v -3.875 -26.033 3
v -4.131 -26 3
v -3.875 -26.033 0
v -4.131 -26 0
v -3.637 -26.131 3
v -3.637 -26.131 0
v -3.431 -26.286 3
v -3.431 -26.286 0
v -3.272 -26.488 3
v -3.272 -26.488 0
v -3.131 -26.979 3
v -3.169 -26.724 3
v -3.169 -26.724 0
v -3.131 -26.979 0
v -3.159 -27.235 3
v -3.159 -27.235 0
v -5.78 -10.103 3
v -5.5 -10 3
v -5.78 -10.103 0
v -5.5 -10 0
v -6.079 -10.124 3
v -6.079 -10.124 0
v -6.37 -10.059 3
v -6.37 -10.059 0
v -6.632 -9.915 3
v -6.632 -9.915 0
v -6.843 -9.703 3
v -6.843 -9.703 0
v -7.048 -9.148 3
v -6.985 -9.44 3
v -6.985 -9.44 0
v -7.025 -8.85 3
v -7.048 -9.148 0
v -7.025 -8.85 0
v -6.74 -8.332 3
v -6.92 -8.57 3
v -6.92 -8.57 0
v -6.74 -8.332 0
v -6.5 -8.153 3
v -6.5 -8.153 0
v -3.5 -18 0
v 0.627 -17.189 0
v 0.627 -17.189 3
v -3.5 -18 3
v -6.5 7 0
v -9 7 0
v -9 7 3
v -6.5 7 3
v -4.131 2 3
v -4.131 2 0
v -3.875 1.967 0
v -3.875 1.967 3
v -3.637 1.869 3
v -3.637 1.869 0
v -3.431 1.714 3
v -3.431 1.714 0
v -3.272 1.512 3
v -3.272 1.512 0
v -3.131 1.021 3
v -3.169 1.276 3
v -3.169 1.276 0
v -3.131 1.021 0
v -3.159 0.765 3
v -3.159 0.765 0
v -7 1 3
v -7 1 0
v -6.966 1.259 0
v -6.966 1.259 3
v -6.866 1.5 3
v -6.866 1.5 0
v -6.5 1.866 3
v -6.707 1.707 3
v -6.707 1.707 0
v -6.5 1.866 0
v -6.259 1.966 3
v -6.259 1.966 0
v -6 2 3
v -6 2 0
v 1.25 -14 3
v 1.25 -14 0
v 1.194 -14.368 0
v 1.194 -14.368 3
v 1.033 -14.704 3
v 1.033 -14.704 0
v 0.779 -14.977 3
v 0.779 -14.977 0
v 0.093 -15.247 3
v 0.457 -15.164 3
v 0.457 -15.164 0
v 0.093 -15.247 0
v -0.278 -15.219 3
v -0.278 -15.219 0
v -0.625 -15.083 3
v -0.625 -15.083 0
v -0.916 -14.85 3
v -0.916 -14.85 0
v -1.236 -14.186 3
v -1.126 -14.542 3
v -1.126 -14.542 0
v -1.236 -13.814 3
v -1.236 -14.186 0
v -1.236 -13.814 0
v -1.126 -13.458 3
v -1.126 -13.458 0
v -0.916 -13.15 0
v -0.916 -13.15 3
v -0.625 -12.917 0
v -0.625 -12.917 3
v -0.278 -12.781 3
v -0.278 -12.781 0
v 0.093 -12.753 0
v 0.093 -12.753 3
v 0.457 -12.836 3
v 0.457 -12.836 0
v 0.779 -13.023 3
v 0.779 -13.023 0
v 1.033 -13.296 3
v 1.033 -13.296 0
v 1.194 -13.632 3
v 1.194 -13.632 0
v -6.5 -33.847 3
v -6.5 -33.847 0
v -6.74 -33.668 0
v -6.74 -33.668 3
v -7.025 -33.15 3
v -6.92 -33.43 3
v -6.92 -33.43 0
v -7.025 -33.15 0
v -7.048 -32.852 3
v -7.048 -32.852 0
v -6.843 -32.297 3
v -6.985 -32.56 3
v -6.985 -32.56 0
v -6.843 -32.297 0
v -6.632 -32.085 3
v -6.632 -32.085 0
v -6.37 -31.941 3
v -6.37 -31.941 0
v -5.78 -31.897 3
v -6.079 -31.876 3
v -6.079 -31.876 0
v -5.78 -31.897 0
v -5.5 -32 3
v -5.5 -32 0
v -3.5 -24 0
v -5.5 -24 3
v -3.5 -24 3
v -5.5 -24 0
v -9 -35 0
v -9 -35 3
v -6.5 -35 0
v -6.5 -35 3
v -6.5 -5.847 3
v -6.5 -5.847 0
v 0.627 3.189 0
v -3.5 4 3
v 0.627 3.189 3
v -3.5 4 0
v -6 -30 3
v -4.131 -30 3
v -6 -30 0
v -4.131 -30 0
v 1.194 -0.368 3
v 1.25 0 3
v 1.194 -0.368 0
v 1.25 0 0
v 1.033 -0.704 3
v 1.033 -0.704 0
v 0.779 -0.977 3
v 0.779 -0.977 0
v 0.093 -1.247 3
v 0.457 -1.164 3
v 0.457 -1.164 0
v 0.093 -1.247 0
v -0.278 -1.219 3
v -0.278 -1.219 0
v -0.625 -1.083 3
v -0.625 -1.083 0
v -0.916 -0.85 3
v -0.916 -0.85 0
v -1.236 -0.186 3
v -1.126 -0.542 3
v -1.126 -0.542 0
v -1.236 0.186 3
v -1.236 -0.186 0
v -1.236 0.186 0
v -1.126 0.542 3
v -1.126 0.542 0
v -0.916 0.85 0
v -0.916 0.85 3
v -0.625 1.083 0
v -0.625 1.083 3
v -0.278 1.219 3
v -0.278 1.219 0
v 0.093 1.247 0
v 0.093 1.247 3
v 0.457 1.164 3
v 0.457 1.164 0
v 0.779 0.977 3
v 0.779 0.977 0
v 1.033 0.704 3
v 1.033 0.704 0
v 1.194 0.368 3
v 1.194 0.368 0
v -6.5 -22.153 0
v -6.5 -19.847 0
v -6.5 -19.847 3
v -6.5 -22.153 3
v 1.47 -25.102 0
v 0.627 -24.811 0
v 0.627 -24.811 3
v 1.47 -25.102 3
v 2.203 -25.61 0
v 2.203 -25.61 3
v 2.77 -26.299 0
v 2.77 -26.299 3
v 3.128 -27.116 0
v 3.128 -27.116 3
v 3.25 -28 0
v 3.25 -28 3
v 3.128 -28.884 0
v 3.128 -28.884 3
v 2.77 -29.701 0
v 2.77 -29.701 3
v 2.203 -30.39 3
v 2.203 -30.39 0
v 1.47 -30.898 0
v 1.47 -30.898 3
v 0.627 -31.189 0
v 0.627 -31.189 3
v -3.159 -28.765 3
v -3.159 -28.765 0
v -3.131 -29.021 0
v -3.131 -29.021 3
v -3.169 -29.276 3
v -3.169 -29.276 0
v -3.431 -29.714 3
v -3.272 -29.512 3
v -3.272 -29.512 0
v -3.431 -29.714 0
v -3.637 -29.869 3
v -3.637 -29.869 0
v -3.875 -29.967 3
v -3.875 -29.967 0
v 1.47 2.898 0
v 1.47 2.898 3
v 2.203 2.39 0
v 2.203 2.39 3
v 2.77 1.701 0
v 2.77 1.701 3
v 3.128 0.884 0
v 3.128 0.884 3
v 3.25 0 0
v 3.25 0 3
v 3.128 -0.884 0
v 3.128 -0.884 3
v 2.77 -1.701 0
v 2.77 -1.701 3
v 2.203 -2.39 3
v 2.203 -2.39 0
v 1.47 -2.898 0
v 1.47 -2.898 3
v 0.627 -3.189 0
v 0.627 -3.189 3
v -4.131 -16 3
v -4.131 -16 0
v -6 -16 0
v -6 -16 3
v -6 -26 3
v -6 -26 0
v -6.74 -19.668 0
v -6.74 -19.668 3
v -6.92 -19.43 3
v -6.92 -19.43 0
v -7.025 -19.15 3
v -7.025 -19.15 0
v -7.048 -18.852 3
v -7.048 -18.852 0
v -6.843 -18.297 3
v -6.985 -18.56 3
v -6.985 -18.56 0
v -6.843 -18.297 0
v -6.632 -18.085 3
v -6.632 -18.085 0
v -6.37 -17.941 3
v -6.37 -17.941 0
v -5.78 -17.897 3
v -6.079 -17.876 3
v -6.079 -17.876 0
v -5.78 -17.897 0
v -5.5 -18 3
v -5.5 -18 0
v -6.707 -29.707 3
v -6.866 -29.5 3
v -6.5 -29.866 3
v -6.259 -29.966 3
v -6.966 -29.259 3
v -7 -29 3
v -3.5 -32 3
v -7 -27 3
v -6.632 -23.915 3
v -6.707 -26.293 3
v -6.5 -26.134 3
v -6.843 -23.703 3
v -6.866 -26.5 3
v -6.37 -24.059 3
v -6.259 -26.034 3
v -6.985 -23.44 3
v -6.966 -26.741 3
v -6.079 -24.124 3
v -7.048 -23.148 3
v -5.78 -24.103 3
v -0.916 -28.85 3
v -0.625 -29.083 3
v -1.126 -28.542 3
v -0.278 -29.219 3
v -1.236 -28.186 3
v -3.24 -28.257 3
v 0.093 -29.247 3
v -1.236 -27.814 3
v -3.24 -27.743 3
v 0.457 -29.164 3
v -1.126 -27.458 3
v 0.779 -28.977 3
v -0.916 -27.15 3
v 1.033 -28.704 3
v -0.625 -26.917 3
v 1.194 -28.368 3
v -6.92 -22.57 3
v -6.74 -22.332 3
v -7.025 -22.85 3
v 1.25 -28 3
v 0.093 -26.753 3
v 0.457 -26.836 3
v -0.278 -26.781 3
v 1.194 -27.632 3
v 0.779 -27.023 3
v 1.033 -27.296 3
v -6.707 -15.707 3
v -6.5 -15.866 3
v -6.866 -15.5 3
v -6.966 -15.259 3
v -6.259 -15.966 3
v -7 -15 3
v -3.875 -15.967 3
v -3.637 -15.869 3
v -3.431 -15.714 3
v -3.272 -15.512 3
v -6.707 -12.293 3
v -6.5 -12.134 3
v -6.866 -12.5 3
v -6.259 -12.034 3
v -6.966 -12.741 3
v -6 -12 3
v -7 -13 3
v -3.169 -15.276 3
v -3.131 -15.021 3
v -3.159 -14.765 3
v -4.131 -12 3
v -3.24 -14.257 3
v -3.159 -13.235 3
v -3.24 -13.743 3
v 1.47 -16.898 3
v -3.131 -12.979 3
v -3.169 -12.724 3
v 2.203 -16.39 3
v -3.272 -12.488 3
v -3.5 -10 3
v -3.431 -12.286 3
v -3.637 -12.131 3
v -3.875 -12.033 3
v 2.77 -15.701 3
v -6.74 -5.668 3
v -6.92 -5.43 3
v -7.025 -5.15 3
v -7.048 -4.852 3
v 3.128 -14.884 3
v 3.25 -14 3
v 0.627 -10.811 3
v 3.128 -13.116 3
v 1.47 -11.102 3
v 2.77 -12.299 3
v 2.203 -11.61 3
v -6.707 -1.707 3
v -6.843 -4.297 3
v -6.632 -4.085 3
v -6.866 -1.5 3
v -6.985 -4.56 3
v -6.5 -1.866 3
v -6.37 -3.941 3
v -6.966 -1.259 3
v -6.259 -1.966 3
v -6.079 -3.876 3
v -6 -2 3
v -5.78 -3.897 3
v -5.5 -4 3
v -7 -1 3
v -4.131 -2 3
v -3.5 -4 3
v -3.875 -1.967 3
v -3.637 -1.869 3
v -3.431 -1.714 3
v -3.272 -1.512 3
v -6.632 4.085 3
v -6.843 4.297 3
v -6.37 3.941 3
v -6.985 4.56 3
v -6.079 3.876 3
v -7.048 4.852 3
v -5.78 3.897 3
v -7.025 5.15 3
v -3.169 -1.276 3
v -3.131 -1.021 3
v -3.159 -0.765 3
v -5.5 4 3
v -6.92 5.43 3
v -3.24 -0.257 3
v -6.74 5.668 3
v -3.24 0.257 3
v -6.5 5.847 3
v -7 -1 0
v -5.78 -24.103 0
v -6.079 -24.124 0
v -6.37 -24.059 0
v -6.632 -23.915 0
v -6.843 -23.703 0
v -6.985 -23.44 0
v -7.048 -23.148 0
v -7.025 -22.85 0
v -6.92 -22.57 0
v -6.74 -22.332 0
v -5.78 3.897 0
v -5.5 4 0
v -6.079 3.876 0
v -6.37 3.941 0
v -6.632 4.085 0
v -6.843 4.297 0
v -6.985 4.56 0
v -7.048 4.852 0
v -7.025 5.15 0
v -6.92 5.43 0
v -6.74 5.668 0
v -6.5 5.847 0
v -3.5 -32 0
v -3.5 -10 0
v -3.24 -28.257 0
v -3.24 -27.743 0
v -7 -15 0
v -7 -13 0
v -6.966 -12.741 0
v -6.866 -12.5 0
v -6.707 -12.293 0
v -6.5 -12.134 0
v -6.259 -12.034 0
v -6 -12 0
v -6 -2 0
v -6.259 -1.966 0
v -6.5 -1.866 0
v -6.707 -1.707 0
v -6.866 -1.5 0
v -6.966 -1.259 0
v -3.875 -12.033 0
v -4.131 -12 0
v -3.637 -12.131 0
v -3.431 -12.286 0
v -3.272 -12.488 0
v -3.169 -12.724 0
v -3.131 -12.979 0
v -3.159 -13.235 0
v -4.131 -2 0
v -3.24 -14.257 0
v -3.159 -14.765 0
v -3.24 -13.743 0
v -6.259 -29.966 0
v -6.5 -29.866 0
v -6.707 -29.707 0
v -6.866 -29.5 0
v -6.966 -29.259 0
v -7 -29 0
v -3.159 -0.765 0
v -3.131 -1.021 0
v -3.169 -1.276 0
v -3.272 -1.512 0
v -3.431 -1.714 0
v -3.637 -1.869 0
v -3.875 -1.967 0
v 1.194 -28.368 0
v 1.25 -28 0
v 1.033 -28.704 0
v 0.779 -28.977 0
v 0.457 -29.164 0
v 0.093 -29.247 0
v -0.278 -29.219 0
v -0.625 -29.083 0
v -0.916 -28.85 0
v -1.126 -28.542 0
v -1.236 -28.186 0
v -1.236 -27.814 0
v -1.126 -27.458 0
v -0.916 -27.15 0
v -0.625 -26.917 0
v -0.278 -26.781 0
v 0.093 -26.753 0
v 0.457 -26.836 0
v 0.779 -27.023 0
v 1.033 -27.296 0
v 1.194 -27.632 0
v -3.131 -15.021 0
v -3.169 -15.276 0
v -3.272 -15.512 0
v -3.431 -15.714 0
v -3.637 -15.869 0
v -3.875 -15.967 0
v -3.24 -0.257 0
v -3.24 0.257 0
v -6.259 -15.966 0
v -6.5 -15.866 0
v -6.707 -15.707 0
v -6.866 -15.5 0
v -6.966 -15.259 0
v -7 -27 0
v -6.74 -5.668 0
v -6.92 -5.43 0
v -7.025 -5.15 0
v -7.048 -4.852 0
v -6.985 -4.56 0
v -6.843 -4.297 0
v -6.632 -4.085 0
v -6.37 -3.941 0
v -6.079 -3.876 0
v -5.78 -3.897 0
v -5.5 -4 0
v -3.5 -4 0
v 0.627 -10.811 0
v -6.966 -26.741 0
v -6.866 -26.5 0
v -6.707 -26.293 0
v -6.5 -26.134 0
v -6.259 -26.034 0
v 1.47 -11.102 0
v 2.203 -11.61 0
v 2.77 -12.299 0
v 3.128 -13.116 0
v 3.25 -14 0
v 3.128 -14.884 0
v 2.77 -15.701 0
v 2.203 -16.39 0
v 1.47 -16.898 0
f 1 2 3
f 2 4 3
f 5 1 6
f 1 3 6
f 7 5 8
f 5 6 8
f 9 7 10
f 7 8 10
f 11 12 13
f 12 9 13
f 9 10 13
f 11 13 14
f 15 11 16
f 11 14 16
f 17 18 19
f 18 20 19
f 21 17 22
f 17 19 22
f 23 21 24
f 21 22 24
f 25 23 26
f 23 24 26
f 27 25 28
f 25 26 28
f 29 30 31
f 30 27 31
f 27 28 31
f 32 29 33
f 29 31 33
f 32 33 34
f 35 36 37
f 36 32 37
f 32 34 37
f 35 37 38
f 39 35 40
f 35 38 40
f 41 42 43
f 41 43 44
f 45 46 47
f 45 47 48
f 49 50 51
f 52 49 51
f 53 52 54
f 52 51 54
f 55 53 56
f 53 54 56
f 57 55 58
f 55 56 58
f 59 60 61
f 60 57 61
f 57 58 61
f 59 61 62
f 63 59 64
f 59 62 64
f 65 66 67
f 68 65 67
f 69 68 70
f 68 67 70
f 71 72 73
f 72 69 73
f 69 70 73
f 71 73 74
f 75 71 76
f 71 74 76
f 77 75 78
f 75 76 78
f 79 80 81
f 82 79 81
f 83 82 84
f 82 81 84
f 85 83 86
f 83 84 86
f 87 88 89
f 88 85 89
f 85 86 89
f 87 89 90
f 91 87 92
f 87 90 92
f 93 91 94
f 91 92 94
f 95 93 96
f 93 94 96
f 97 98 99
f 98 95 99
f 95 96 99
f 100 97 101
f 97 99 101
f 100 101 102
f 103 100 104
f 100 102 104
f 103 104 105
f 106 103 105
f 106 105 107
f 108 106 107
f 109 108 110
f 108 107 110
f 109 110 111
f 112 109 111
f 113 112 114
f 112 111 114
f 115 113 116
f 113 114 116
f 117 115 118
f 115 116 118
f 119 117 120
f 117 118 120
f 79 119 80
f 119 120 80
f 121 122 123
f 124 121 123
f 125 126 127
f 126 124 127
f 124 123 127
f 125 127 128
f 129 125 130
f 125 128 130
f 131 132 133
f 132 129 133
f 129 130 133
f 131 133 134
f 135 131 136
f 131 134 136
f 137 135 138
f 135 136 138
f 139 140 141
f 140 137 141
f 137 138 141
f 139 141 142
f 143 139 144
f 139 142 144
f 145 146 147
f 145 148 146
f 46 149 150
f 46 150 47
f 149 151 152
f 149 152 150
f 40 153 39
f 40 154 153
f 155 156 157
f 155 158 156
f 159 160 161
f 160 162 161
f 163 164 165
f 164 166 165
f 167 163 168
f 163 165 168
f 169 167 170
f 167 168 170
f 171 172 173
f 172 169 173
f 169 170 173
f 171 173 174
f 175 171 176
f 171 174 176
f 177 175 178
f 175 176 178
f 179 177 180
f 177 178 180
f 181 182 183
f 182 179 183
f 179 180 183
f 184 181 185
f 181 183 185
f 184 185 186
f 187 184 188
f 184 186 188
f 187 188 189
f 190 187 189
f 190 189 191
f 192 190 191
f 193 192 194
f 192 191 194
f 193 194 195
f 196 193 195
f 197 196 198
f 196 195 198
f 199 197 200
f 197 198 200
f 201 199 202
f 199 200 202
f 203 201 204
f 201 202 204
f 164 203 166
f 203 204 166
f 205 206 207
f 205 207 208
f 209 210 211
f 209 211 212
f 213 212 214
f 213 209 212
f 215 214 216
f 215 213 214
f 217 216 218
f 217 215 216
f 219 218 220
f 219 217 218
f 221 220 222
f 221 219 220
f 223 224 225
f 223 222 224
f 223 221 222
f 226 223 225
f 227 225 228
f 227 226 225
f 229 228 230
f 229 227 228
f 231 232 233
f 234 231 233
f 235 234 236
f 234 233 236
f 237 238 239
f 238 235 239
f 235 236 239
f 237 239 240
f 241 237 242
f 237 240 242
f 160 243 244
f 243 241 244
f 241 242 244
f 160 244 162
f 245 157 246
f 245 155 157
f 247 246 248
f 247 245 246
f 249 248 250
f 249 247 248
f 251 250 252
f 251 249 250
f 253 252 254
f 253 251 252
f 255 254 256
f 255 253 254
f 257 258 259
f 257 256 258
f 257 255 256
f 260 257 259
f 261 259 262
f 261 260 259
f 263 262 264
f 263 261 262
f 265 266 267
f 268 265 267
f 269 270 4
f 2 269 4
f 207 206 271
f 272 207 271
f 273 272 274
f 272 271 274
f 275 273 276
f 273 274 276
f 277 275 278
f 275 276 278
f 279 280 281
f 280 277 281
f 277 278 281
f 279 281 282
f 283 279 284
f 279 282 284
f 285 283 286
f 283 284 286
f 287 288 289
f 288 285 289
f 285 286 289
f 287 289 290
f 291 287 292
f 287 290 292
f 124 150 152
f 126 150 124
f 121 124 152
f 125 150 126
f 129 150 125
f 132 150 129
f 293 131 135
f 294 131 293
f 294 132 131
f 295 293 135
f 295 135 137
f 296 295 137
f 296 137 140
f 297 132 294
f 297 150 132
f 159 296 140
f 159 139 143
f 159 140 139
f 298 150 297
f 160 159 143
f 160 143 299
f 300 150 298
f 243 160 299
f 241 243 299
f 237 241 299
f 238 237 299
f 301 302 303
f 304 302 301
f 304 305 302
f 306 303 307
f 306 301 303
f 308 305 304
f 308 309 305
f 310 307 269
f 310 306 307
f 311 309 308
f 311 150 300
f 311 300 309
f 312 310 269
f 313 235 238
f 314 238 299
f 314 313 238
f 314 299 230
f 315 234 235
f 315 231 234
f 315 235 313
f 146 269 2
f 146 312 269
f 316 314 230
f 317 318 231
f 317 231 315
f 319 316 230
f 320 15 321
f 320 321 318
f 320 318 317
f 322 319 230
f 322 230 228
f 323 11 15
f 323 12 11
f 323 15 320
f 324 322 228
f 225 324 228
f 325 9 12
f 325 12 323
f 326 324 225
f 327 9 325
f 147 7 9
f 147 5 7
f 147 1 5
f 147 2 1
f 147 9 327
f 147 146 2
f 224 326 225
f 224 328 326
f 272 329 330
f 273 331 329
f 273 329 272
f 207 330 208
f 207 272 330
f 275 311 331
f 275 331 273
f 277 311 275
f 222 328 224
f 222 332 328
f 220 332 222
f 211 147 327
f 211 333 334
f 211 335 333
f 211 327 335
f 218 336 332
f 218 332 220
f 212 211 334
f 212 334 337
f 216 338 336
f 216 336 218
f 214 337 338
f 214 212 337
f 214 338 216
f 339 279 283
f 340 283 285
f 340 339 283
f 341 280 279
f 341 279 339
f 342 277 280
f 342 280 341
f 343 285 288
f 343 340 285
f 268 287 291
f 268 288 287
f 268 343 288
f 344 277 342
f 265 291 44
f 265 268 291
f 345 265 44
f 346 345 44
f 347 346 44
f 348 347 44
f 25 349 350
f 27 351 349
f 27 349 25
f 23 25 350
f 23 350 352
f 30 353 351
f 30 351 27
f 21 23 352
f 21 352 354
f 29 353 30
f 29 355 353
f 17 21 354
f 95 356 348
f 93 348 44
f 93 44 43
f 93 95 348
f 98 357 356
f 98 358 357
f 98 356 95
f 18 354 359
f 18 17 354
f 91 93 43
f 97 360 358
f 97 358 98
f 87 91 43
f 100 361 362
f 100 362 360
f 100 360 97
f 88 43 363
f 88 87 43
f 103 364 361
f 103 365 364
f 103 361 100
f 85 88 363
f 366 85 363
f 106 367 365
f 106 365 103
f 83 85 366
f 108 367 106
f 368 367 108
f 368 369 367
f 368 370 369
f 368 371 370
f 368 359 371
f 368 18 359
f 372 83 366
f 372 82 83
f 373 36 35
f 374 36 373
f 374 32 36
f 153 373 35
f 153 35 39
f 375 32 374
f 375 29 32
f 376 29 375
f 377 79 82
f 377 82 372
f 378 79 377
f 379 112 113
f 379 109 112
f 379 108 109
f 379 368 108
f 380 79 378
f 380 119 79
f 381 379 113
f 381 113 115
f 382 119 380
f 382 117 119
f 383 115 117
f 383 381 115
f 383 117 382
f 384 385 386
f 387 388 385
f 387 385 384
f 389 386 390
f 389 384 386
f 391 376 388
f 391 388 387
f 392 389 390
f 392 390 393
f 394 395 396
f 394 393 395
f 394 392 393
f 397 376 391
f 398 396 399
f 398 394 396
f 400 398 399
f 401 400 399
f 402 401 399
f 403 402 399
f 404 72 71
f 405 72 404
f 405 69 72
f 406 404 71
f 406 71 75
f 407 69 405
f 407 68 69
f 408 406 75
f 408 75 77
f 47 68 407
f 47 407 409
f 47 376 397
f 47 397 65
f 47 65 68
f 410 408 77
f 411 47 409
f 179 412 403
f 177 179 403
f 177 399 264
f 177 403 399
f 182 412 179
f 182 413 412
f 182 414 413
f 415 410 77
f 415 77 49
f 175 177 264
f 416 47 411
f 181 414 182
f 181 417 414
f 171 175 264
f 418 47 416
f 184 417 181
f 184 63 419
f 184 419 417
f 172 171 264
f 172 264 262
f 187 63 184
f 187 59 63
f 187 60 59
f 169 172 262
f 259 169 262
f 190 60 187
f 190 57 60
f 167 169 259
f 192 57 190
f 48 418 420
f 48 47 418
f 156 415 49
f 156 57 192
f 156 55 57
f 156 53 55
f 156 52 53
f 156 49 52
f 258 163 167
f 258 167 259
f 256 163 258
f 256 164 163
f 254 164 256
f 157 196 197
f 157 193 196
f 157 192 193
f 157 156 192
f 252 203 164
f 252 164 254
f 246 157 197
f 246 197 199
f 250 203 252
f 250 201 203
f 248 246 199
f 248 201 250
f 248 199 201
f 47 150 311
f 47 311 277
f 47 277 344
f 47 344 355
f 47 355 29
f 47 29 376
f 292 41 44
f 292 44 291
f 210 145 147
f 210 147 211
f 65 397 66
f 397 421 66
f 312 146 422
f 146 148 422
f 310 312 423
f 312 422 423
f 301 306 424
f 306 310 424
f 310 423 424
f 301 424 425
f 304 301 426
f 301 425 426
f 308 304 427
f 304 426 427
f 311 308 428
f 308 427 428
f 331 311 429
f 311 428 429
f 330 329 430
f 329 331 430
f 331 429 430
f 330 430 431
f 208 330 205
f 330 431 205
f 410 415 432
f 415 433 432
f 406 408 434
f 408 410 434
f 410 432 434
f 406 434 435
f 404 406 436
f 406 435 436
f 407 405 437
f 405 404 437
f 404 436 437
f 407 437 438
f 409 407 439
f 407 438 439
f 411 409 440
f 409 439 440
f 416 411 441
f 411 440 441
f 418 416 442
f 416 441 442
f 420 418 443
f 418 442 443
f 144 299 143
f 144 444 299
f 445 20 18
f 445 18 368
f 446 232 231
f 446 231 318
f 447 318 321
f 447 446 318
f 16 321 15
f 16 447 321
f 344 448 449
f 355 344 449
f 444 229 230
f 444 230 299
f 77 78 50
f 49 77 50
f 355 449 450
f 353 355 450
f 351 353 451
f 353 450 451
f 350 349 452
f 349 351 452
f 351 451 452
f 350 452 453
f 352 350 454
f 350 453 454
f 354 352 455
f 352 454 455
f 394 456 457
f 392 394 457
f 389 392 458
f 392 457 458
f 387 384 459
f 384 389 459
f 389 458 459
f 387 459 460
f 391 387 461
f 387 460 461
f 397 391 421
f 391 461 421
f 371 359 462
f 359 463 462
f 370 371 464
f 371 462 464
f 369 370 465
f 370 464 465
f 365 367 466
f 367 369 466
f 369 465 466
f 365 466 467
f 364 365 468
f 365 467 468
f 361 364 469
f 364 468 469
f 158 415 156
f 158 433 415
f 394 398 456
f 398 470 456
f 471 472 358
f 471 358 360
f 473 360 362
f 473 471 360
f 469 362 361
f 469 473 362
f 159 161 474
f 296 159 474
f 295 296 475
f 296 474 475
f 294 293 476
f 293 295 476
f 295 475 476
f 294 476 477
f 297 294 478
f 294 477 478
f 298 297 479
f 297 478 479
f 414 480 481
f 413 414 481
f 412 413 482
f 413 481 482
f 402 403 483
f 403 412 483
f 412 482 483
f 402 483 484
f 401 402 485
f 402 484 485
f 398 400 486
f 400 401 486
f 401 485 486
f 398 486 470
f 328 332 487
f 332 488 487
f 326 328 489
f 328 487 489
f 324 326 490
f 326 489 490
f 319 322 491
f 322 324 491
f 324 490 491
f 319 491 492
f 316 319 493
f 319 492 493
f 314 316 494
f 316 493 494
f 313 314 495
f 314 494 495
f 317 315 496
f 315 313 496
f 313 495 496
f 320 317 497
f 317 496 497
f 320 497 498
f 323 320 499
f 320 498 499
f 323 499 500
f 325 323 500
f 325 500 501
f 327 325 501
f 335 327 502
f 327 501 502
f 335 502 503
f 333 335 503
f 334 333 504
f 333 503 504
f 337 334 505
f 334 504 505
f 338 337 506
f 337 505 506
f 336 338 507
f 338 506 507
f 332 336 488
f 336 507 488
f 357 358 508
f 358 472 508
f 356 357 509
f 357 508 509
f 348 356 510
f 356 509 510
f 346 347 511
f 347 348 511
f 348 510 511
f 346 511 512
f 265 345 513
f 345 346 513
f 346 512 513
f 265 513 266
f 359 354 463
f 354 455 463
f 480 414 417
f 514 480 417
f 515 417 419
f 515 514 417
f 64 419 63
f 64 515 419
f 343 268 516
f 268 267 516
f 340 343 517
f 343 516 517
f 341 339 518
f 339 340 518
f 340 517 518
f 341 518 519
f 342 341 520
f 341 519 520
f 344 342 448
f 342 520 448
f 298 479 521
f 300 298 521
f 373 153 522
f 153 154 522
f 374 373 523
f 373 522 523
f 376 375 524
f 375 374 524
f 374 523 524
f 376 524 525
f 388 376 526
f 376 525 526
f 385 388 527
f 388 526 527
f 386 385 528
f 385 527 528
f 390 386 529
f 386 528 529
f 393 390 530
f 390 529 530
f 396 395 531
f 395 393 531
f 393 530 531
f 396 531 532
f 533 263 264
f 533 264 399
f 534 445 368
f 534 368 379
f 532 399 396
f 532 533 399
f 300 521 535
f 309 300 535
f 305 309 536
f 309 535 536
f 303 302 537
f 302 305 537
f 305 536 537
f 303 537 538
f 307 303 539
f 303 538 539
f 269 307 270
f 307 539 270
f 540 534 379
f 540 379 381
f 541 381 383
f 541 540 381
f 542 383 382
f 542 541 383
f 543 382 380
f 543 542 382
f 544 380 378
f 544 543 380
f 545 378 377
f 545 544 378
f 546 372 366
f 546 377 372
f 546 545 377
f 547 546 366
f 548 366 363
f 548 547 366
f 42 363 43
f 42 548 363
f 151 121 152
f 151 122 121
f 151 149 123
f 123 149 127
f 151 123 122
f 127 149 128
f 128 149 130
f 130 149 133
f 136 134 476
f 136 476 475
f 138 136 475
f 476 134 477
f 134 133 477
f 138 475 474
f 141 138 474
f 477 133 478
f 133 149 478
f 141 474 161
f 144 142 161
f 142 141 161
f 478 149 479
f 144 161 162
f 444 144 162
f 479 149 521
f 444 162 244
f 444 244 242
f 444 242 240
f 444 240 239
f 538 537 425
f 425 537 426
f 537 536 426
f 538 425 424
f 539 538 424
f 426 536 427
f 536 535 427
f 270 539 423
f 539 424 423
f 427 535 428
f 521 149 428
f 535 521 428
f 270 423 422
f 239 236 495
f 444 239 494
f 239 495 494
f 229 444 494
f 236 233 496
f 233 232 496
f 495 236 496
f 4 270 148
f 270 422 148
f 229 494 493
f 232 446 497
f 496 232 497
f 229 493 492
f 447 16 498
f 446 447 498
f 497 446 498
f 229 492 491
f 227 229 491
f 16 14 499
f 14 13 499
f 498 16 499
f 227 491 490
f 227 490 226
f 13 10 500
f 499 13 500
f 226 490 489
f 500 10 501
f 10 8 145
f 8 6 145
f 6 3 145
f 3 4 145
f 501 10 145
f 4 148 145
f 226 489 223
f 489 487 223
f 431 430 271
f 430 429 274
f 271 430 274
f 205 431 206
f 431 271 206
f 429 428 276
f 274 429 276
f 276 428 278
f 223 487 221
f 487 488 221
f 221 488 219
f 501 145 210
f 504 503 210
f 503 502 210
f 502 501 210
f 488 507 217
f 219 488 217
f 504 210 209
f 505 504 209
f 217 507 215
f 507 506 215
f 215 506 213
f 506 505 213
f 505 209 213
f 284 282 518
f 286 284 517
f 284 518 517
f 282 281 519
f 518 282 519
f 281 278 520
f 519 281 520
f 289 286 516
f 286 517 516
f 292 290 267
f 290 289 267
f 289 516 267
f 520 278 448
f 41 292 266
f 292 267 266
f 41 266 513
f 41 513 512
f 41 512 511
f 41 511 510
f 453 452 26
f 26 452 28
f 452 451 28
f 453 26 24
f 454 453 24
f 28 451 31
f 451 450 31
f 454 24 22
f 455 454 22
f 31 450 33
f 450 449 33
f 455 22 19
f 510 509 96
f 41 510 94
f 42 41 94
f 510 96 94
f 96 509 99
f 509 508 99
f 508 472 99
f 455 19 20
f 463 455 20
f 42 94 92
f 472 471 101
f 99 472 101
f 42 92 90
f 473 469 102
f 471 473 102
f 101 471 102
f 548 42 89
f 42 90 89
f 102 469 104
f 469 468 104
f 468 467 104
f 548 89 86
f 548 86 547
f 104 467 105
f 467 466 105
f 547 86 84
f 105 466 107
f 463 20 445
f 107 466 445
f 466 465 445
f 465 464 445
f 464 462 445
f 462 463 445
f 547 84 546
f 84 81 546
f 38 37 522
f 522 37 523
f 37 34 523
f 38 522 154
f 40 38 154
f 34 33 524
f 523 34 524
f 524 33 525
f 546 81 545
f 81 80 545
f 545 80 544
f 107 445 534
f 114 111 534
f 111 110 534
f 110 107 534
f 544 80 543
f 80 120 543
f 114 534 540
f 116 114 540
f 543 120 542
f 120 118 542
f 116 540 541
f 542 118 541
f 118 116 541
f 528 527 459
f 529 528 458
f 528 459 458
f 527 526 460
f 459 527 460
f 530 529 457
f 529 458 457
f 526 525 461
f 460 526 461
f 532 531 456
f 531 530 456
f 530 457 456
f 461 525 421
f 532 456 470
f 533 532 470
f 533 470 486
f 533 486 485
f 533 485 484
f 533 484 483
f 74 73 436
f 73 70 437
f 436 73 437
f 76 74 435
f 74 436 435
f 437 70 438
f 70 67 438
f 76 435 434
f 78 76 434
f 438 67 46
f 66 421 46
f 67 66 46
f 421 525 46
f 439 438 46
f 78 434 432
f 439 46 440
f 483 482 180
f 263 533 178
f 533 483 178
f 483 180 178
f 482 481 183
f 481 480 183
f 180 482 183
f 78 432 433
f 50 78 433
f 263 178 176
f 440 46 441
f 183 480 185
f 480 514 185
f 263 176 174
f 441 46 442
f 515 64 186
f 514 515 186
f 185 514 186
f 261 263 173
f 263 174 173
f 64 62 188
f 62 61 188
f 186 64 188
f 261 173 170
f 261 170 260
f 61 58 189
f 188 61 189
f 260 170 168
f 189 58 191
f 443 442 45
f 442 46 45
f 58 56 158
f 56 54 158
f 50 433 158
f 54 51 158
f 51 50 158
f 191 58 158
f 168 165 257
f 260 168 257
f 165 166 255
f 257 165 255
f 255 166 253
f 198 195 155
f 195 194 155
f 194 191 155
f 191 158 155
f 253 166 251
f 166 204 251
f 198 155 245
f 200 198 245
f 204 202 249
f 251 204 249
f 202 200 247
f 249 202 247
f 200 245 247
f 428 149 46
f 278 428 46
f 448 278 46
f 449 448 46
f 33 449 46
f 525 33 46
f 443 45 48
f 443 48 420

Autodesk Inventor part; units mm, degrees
ref_plane "YZ Plane" through (0, 0, 0) normal (1, 0, 0) x (0, 1, 0)
ref_plane "XZ Plane" through (0, 0, 0) normal (0, 1, 0) x (-1, 0, 0)
ref_plane "XY Plane" through (0, 0, 0) normal (0, 0, 1) x (1, 0, 0)
sketch "スケッチ1" plane through (0, 0, 0) normal (0, 0, 1) x (1, 0, 0)
  line L0 (-7, -29) -> (-7, -27)
  arc A0 (-6, -26) -> (-7, -27) centre (-6, -27) ccw
  line L1 (-6, -26) -> (-4.1307, -26)
  arc A1 (-3.1588, -27.2353) -> (-4.1307, -26) centre (-4.1307, -27) ccw
  arc A2 (-3.1588, -27.2353) -> (-3.1588, -28.7647) centre (0, -28) ccw
  arc A3 (-4.1307, -30) -> (-3.1588, -28.7647) centre (-4.1307, -29) ccw
  line L2 (-4.1307, -30) -> (-6, -30)
  arc A4 (-7, -29) -> (-6, -30) centre (-6, -29) ccw
  arc A5 (-6.5, -22.1534) -> (-5.5, -24) centre (-6, -23.0767) ccw
  line L3 (-6.5, -21) -> (-6.5, -22.1534)
  line L4 (-9, -21) -> (-6.5, -21)
  line L5 (-9, -35) -> (-9, -21)
  line L6 (-6.5, -35) -> (-9, -35)
  line L7 (-6.5, -33.8466) -> (-6.5, -35)
  arc A6 (-5.5, -32) -> (-6.5, -33.8466) centre (-6, -32.9233) ccw
  line L8 (-3.5, -32) -> (-5.5, -32)
  line L9 (0.6267, -31.189) -> (-3.5, -32)
  arc A7 (0.6267, -31.189) -> (0.6267, -24.811) centre (0, -28) ccw
  line L10 (-3.5, -24) -> (0.6267, -24.811)
  line L11 (-5.5, -24) -> (-3.5, -24)
  circle A8 centre (0, -28) radius 1.25
  line L12 (-7, -15) -> (-7, -13)
  arc A9 (-6, -12) -> (-7, -13) centre (-6, -13) ccw
  line L13 (-6, -12) -> (-4.1307, -12)
  arc A10 (-3.1588, -13.2353) -> (-4.1307, -12) centre (-4.1307, -13) ccw
  arc A11 (-3.1588, -13.2353) -> (-3.1588, -14.7647) centre (0, -14) ccw
  arc A12 (-4.1307, -16) -> (-3.1588, -14.7647) centre (-4.1307, -15) ccw
  line L14 (-4.1307, -16) -> (-6, -16)
  arc A13 (-7, -15) -> (-6, -16) centre (-6, -15) ccw
  arc A14 (-6.5, -8.1534) -> (-5.5, -10) centre (-6, -9.0767) ccw
  line L15 (-6.5, -7) -> (-6.5, -8.1534)
  line L16 (-9, -7) -> (-6.5, -7)
  line L17 (-9, -21) -> (-9, -7)
  line L18 (-6.5, -21) -> (-9, -21)
  line L19 (-6.5, -19.8466) -> (-6.5, -21)
  arc A15 (-5.5, -18) -> (-6.5, -19.8466) centre (-6, -18.9233) ccw
  line L20 (-3.5, -18) -> (-5.5, -18)
  line L21 (0.6267, -17.189) -> (-3.5, -18)
  arc A16 (0.6267, -17.189) -> (0.6267, -10.811) centre (0, -14) ccw
  line L22 (-3.5, -10) -> (0.6267, -10.811)
  line L23 (-5.5, -10) -> (-3.5, -10)
  circle A17 centre (0, -14) radius 1.25
  line L24 (-7, -1) -> (-7, 1)
  arc A18 (-6, 2) -> (-7, 1) centre (-6, 1) ccw
  line L25 (-6, 2) -> (-4.1307, 2)
  arc A19 (-3.1588, 0.7647) -> (-4.1307, 2) centre (-4.1307, 1) ccw
  arc A20 (-3.1588, 0.7647) -> (-3.1588, -0.7647) centre (0, 0) ccw
  arc A21 (-4.1307, -2) -> (-3.1588, -0.7647) centre (-4.1307, -1) ccw
  line L26 (-4.1307, -2) -> (-6, -2)
  arc A22 (-7, -1) -> (-6, -2) centre (-6, -1) ccw
  arc A23 (-6.5, 5.8466) -> (-5.5, 4) centre (-6, 4.9233) ccw
  line L27 (-6.5, 7) -> (-6.5, 5.8466)
  line L28 (-9, 7) -> (-6.5, 7)
  line L29 (-9, -7) -> (-9, 7)
  line L30 (-6.5, -7) -> (-9, -7)
  line L31 (-6.5, -5.8466) -> (-6.5, -7)
  arc A24 (-5.5, -4) -> (-6.5, -5.8466) centre (-6, -4.9233) ccw
  line L32 (-3.5, -4) -> (-5.5, -4)
  line L33 (0.6267, -3.189) -> (-3.5, -4)
  arc A25 (0.6267, -3.189) -> (0.6267, 3.189) centre (0, 0) ccw
  line L34 (-3.5, 4) -> (0.6267, 3.189)
  line L35 (-5.5, 4) -> (-3.5, 4)
  circle A26 centre (0, 0) radius 1.25
extrude "押し出し1" add sketch "スケッチ1" along normal blind 3
properties part number "アームユニット底板締結パーツ3t用" material "アルミニウム 2014-T4"
